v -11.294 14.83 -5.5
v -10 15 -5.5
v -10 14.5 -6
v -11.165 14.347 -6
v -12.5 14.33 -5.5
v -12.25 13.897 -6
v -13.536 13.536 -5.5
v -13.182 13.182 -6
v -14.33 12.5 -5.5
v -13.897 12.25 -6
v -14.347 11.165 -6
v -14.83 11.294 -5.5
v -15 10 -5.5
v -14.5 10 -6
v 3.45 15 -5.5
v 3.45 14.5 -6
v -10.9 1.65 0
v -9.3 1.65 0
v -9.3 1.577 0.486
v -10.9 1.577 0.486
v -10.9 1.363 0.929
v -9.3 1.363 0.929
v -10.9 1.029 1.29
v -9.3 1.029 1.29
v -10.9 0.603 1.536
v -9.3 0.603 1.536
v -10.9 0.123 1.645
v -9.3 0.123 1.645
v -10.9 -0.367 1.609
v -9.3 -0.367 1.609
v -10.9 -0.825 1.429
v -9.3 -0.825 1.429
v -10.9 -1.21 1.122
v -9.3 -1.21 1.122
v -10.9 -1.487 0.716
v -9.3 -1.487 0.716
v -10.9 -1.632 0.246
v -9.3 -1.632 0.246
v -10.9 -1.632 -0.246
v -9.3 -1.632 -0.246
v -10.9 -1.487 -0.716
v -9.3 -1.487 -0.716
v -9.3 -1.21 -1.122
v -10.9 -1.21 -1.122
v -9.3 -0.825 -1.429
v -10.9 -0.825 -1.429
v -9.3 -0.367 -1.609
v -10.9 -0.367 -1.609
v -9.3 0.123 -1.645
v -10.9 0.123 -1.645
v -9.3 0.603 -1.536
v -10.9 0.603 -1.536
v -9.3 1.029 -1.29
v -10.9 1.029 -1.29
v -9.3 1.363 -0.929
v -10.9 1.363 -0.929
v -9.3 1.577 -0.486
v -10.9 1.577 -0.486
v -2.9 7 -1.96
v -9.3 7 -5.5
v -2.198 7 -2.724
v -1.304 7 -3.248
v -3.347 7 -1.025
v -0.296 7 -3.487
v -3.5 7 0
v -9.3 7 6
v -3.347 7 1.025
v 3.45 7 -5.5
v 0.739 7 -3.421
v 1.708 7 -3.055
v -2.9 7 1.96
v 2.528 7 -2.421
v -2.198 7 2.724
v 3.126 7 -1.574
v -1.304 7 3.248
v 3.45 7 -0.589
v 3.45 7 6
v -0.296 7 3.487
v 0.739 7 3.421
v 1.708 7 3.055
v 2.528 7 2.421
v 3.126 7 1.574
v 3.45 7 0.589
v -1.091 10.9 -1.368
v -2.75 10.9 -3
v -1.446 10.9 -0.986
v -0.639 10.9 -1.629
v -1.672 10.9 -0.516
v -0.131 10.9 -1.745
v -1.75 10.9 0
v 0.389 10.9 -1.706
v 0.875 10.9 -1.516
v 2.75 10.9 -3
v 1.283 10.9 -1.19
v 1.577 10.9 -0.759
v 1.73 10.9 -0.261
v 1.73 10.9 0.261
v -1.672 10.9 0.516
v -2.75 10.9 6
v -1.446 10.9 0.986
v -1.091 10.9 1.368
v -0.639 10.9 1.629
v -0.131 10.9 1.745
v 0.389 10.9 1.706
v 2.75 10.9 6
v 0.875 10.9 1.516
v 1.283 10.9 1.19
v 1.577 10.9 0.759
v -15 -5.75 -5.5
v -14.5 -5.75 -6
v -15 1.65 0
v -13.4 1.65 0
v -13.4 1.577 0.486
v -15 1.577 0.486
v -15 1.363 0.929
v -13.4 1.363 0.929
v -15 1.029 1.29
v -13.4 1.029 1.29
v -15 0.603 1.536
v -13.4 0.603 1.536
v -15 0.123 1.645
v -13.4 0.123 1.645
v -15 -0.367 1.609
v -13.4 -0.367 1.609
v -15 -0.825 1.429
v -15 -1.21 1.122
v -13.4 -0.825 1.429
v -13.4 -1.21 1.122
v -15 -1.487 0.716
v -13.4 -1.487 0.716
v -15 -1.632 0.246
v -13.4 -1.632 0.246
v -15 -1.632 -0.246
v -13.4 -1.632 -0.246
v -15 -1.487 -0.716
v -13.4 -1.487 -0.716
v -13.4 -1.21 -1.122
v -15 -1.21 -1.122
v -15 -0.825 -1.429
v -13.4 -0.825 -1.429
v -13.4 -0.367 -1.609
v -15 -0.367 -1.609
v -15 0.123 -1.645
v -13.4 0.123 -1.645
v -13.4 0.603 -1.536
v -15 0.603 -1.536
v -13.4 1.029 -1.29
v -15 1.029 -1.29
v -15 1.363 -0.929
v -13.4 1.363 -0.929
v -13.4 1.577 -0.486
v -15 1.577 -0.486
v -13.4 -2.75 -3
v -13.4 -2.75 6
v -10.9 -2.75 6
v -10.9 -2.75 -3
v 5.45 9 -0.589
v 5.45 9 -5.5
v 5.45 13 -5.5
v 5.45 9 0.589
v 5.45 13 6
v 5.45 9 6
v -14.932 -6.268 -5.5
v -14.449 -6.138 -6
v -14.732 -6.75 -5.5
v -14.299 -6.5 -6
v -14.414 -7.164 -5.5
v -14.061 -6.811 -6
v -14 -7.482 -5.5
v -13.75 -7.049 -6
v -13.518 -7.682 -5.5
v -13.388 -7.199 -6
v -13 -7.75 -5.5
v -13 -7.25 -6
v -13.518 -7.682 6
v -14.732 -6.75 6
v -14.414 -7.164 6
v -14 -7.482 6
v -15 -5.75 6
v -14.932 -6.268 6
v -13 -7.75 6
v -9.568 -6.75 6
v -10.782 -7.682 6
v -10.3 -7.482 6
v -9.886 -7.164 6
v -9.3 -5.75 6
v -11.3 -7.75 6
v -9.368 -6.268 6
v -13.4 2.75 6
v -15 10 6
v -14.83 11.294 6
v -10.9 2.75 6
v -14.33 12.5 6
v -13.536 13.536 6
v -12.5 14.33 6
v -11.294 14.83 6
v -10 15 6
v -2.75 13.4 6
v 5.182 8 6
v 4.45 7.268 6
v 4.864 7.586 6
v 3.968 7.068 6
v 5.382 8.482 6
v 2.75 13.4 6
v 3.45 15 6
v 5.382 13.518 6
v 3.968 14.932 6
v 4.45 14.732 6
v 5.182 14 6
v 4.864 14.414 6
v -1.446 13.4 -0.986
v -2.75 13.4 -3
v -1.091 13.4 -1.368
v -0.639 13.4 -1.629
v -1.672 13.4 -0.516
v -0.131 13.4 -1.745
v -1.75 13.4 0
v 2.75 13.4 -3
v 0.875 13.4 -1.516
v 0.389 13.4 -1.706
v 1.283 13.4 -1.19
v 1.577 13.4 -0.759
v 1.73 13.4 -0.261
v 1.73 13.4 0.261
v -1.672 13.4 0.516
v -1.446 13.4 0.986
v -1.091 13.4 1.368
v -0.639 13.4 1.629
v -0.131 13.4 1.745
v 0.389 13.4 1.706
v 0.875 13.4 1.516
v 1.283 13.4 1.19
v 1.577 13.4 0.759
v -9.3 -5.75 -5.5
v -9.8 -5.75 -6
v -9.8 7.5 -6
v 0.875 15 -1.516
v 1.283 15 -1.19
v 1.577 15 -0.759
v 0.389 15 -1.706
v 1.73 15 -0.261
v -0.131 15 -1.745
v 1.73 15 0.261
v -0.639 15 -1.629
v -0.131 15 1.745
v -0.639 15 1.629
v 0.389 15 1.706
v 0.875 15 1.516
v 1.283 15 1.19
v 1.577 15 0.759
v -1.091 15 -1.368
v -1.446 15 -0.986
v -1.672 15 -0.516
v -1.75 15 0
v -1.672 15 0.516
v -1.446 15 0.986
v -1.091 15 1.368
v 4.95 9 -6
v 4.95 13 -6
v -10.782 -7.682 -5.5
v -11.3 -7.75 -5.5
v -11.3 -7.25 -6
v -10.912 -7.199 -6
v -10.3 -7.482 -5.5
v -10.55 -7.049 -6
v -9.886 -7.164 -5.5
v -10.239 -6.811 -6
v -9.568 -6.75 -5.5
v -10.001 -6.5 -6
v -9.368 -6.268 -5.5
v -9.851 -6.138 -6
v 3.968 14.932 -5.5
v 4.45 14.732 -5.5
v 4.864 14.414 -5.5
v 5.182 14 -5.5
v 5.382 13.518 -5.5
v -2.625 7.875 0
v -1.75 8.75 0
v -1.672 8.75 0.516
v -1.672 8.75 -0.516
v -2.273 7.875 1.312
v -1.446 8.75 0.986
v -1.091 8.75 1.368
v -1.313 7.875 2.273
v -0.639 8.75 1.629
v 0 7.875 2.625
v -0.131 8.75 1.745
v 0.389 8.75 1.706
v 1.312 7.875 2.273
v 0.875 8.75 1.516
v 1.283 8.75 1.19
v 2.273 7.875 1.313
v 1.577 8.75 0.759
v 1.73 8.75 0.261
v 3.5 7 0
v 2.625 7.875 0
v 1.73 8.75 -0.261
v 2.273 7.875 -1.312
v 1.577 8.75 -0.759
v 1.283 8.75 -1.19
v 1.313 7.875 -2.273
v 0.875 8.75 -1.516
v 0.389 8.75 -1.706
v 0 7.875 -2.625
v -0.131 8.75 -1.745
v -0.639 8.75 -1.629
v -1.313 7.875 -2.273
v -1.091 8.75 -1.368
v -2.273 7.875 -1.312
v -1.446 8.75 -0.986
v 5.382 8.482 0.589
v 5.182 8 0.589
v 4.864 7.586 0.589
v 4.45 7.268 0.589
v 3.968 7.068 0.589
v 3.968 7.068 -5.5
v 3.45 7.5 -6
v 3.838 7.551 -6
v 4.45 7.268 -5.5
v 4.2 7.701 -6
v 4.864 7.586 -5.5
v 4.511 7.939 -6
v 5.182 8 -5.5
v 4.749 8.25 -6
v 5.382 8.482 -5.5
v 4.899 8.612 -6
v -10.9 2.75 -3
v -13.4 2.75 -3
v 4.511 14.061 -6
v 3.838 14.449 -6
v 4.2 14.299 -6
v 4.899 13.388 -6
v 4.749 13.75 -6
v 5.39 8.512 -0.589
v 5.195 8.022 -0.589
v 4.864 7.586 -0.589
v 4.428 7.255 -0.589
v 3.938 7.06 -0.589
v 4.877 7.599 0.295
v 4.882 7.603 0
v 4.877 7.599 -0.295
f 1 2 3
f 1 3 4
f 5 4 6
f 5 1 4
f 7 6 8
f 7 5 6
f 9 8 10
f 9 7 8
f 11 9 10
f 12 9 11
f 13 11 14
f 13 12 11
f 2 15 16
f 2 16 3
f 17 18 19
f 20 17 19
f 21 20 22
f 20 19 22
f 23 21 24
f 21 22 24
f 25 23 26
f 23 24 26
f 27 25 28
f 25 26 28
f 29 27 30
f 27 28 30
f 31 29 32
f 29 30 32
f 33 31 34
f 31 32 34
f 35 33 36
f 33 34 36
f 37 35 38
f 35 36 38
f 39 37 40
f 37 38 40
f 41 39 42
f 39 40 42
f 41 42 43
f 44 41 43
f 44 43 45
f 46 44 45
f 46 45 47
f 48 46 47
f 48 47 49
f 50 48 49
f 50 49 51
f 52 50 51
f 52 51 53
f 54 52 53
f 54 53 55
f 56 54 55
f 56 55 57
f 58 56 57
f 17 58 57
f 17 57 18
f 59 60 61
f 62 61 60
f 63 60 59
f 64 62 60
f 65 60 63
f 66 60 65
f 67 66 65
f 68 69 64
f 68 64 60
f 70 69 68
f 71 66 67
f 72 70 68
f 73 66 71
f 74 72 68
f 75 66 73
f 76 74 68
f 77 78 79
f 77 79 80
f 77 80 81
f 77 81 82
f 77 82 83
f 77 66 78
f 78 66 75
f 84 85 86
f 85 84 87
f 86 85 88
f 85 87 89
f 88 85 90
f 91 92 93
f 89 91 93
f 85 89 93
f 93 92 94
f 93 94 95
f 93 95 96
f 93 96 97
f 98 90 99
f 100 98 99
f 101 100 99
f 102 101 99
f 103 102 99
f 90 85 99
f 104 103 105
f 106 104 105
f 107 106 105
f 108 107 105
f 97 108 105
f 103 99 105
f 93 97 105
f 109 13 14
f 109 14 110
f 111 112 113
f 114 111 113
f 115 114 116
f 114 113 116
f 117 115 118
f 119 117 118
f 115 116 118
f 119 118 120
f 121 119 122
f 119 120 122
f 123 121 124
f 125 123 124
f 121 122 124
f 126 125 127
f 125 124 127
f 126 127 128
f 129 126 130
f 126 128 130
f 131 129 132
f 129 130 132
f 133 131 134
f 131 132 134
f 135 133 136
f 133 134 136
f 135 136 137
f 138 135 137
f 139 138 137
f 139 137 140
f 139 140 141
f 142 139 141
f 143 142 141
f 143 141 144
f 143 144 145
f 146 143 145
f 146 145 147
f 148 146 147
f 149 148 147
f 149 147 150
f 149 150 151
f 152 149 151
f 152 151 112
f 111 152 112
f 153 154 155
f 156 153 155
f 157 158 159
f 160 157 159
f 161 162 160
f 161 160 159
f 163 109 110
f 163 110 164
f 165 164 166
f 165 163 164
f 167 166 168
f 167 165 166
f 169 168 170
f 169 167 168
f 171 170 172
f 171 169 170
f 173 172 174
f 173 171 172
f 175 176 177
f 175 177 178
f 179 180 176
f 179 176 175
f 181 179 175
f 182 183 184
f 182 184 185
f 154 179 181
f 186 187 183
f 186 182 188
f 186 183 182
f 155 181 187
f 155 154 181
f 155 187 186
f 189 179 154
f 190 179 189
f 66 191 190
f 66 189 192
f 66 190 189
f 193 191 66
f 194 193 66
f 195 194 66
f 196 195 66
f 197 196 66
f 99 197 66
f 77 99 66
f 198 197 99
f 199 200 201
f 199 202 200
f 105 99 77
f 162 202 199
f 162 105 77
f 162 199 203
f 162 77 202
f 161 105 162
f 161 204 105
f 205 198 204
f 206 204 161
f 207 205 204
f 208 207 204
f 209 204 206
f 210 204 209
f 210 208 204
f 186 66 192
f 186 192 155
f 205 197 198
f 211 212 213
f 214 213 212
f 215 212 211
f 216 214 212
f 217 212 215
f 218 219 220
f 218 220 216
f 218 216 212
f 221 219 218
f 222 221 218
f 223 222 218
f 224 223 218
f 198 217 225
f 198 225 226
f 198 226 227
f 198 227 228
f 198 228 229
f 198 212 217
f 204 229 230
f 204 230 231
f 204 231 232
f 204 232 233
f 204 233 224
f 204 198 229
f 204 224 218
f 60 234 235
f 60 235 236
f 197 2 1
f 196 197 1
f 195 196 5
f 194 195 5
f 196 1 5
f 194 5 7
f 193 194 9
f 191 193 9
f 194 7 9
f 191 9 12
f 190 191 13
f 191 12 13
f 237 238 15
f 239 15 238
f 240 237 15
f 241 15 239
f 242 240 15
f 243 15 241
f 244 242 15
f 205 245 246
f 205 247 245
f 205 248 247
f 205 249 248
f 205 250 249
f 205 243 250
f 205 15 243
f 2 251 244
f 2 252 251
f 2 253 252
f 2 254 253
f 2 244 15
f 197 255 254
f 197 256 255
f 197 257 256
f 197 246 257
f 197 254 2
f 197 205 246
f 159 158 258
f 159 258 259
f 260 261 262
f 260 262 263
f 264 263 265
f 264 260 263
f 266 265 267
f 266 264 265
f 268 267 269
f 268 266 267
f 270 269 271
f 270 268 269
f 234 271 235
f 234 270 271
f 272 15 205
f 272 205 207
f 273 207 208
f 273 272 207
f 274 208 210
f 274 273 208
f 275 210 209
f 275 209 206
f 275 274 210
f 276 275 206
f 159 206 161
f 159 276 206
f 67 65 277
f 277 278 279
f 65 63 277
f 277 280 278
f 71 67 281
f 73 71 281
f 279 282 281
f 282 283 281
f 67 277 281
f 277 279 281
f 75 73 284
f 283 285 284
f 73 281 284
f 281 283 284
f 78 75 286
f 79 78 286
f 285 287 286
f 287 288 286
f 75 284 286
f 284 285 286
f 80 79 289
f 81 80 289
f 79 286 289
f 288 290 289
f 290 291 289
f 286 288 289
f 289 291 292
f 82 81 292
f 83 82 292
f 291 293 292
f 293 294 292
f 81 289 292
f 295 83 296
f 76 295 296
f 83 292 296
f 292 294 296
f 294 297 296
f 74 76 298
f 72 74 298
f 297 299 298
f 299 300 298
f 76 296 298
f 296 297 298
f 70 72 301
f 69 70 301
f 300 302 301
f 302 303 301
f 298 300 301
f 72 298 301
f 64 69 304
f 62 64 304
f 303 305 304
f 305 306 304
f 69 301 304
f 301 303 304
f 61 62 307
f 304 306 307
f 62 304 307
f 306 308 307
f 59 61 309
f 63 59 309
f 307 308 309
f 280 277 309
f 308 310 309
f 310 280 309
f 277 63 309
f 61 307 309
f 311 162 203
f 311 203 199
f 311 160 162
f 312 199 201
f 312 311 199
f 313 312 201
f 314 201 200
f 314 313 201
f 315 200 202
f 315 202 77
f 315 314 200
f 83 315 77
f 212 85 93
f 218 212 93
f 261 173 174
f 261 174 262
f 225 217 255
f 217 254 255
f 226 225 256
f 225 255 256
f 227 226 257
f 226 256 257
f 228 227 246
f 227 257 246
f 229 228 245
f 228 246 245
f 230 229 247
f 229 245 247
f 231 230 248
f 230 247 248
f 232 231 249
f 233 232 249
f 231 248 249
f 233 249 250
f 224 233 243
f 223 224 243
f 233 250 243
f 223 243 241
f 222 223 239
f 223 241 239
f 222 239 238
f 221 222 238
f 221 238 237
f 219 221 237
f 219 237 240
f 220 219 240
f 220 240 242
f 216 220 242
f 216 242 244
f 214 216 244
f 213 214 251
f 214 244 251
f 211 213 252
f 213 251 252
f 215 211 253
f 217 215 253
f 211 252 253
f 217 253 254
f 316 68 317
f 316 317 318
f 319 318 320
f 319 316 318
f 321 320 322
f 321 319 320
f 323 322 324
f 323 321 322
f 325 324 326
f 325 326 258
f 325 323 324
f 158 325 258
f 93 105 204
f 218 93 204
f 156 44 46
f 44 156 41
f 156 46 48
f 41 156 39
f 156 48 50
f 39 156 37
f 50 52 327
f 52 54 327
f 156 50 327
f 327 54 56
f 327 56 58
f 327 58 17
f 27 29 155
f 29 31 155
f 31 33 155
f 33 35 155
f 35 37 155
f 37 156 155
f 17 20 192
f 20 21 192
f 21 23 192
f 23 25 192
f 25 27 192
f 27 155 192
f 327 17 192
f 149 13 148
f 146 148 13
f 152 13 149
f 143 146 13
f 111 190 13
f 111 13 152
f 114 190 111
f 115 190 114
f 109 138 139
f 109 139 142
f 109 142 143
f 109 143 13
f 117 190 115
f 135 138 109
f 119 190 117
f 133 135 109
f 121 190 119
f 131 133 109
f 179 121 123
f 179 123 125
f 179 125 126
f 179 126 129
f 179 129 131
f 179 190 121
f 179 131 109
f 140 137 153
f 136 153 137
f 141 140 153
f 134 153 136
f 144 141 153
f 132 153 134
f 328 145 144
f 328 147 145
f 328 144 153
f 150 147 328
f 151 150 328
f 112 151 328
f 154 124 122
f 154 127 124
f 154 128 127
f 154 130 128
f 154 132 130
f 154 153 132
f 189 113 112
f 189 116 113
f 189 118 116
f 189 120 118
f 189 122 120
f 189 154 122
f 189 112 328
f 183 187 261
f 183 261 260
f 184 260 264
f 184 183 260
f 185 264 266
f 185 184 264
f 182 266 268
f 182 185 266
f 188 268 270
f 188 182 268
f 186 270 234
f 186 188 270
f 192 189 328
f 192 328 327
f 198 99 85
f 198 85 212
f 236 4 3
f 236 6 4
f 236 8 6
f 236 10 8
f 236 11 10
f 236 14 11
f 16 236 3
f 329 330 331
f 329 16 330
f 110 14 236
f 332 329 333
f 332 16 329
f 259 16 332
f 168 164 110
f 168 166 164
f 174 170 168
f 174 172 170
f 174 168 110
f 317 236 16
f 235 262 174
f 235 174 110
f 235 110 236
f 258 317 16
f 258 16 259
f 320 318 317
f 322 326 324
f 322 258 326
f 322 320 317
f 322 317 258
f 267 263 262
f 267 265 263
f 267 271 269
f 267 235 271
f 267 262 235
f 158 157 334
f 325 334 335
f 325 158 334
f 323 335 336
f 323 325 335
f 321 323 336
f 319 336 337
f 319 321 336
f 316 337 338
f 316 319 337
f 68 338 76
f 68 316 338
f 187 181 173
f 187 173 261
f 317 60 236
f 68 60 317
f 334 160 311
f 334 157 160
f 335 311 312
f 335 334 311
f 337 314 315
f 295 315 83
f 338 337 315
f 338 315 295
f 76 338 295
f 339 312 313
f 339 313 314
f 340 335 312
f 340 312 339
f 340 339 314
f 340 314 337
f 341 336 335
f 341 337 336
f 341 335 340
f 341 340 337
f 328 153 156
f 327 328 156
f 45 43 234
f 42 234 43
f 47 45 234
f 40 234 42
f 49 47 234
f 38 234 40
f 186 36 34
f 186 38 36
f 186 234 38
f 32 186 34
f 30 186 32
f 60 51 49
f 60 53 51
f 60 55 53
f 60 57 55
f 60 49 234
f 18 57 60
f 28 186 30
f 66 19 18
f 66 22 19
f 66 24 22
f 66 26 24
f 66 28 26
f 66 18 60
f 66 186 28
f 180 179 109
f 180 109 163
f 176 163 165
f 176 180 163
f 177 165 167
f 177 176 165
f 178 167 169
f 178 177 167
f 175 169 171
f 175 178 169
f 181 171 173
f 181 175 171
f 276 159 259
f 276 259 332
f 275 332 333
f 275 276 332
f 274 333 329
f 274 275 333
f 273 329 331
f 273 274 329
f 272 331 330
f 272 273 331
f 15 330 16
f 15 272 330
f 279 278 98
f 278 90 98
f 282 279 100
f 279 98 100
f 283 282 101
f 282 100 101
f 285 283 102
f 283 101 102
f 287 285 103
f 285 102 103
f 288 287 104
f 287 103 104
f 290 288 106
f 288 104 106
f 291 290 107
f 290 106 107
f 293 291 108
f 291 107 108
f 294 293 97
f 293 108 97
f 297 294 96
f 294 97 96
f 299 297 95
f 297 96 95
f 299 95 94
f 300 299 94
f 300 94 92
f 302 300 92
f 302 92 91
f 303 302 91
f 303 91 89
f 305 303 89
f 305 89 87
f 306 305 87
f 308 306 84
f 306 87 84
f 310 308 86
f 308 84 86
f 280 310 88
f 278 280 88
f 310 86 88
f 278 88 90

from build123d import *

# Parameters (mm, degrees)
F0_W           = 2.5
F0_H           = 5.5
F0_W_2         = 5.5
F0_H_2         = 2.5
F1_DEPTH       = 6
F1_DEPTH_BACK  = 6
F2_W           = 2.5
F2_H           = 5.5
F2_W_2         = 5.5
F2_H_2         = 2.5
F3_DEPTH       = 3
F6_D           = 3.3
F6_DEPTH       = 100
F6_TIP         = 0.9914200214
F7_D           = 3.5
F7_DEPTH       = 100
F7_CSINK_D     = 7
F7_CSINK_ANGLE = 90
F7_TIP         = 1.0515060833
F8_R           = 5
F9_R           = 2
F10_SIZE       = 0.5


with BuildPart() as f1:
    # F0 (on Top) → F1 (new body, two sides)
    with BuildSketch(Plane.XY) as f1_sk:
        Polygon((-15, 15), (-15, -7.75), (-9.3, -7.75), (-9.3, 7), (5.45, 7), (5.45, 15), align=None)
        with Locations((-12.15, 0)):
            Rectangle(F0_W, F0_H, mode=Mode.SUBTRACT)
        with Locations((0, 12.15)):
            Rectangle(F0_W_2, F0_H_2, mode=Mode.SUBTRACT)
    extrude(amount=F1_DEPTH)
    extrude(f1_sk.sketch, amount=-F1_DEPTH_BACK)

    # F2 (on face) → F3 (join)
    with BuildSketch(Plane(origin=(0, 0, -6), x_dir=(1, 0, 0), z_dir=(0, 0, -1))):
        with Locations((-12.15, 0)):
            Rectangle(F2_W, F2_H)
        with Locations((0, -12.15)):
            Rectangle(F2_W_2, F2_H_2)
    extrude(amount=-F3_DEPTH)

    # F6
    with Locations(Plane(origin=(-15, 0, 0), x_dir=(0, -1, 0), z_dir=(-1, 0, 0))):
        with Locations((0, 0)):
            Hole(F6_D / 2, depth=F6_DEPTH)
            with Locations((0, 0, -(F6_DEPTH + F6_TIP / 2))):  # 118° drill point
                Cone(0, F6_D / 2, F6_TIP, mode=Mode.SUBTRACT)

    # F7
    with Locations(Plane.XZ.offset(-7)):
        with Locations((0, 0)):
            CounterSinkHole(F7_D / 2, F7_CSINK_D / 2, depth=F7_DEPTH, counter_sink_angle=F7_CSINK_ANGLE)
            with Locations((0, 0, -(F7_DEPTH + F7_TIP / 2))):  # 118° drill point
                Cone(0, F7_D / 2, F7_TIP, mode=Mode.SUBTRACT)

    # F8
    f8_edges = [f1.edges().sort_by_distance(p)[0] for p in [
        (-15, 15, 0),
    ]]
    fillet(f8_edges, radius=F8_R)

    # F9
    f9_edges = [f1.edges().sort_by_distance(p)[0] for p in [
        (-15, -7.75, 0),
        (-9.3, -7.75, 0),
        (5.45, 7, 0),
        (5.45, 15, 0),
    ]]
    fillet(f9_edges, radius=F9_R)

    # F10
    f10_edges = [f1.edges().sort_by_distance(p)[0] for p in [
        (-3.275, 15, -6),
        (4.864214, 14.414214, -6),
        (-13.535534, 13.535534, -6),
        (5.45, 11, -6),
        (-15, 2.125, -6),
        (4.864214, 7.585786, -6),
        (-14.414214, -7.164214, -6),
        (-2.925, 7, -6),
        (-12.15, -7.75, -6),
        (-9.3, 0.625, -6),
        (-9.885786, -7.164214, -6),
    ]]
    chamfer(f10_edges, length=F10_SIZE)


solid = f1.part
